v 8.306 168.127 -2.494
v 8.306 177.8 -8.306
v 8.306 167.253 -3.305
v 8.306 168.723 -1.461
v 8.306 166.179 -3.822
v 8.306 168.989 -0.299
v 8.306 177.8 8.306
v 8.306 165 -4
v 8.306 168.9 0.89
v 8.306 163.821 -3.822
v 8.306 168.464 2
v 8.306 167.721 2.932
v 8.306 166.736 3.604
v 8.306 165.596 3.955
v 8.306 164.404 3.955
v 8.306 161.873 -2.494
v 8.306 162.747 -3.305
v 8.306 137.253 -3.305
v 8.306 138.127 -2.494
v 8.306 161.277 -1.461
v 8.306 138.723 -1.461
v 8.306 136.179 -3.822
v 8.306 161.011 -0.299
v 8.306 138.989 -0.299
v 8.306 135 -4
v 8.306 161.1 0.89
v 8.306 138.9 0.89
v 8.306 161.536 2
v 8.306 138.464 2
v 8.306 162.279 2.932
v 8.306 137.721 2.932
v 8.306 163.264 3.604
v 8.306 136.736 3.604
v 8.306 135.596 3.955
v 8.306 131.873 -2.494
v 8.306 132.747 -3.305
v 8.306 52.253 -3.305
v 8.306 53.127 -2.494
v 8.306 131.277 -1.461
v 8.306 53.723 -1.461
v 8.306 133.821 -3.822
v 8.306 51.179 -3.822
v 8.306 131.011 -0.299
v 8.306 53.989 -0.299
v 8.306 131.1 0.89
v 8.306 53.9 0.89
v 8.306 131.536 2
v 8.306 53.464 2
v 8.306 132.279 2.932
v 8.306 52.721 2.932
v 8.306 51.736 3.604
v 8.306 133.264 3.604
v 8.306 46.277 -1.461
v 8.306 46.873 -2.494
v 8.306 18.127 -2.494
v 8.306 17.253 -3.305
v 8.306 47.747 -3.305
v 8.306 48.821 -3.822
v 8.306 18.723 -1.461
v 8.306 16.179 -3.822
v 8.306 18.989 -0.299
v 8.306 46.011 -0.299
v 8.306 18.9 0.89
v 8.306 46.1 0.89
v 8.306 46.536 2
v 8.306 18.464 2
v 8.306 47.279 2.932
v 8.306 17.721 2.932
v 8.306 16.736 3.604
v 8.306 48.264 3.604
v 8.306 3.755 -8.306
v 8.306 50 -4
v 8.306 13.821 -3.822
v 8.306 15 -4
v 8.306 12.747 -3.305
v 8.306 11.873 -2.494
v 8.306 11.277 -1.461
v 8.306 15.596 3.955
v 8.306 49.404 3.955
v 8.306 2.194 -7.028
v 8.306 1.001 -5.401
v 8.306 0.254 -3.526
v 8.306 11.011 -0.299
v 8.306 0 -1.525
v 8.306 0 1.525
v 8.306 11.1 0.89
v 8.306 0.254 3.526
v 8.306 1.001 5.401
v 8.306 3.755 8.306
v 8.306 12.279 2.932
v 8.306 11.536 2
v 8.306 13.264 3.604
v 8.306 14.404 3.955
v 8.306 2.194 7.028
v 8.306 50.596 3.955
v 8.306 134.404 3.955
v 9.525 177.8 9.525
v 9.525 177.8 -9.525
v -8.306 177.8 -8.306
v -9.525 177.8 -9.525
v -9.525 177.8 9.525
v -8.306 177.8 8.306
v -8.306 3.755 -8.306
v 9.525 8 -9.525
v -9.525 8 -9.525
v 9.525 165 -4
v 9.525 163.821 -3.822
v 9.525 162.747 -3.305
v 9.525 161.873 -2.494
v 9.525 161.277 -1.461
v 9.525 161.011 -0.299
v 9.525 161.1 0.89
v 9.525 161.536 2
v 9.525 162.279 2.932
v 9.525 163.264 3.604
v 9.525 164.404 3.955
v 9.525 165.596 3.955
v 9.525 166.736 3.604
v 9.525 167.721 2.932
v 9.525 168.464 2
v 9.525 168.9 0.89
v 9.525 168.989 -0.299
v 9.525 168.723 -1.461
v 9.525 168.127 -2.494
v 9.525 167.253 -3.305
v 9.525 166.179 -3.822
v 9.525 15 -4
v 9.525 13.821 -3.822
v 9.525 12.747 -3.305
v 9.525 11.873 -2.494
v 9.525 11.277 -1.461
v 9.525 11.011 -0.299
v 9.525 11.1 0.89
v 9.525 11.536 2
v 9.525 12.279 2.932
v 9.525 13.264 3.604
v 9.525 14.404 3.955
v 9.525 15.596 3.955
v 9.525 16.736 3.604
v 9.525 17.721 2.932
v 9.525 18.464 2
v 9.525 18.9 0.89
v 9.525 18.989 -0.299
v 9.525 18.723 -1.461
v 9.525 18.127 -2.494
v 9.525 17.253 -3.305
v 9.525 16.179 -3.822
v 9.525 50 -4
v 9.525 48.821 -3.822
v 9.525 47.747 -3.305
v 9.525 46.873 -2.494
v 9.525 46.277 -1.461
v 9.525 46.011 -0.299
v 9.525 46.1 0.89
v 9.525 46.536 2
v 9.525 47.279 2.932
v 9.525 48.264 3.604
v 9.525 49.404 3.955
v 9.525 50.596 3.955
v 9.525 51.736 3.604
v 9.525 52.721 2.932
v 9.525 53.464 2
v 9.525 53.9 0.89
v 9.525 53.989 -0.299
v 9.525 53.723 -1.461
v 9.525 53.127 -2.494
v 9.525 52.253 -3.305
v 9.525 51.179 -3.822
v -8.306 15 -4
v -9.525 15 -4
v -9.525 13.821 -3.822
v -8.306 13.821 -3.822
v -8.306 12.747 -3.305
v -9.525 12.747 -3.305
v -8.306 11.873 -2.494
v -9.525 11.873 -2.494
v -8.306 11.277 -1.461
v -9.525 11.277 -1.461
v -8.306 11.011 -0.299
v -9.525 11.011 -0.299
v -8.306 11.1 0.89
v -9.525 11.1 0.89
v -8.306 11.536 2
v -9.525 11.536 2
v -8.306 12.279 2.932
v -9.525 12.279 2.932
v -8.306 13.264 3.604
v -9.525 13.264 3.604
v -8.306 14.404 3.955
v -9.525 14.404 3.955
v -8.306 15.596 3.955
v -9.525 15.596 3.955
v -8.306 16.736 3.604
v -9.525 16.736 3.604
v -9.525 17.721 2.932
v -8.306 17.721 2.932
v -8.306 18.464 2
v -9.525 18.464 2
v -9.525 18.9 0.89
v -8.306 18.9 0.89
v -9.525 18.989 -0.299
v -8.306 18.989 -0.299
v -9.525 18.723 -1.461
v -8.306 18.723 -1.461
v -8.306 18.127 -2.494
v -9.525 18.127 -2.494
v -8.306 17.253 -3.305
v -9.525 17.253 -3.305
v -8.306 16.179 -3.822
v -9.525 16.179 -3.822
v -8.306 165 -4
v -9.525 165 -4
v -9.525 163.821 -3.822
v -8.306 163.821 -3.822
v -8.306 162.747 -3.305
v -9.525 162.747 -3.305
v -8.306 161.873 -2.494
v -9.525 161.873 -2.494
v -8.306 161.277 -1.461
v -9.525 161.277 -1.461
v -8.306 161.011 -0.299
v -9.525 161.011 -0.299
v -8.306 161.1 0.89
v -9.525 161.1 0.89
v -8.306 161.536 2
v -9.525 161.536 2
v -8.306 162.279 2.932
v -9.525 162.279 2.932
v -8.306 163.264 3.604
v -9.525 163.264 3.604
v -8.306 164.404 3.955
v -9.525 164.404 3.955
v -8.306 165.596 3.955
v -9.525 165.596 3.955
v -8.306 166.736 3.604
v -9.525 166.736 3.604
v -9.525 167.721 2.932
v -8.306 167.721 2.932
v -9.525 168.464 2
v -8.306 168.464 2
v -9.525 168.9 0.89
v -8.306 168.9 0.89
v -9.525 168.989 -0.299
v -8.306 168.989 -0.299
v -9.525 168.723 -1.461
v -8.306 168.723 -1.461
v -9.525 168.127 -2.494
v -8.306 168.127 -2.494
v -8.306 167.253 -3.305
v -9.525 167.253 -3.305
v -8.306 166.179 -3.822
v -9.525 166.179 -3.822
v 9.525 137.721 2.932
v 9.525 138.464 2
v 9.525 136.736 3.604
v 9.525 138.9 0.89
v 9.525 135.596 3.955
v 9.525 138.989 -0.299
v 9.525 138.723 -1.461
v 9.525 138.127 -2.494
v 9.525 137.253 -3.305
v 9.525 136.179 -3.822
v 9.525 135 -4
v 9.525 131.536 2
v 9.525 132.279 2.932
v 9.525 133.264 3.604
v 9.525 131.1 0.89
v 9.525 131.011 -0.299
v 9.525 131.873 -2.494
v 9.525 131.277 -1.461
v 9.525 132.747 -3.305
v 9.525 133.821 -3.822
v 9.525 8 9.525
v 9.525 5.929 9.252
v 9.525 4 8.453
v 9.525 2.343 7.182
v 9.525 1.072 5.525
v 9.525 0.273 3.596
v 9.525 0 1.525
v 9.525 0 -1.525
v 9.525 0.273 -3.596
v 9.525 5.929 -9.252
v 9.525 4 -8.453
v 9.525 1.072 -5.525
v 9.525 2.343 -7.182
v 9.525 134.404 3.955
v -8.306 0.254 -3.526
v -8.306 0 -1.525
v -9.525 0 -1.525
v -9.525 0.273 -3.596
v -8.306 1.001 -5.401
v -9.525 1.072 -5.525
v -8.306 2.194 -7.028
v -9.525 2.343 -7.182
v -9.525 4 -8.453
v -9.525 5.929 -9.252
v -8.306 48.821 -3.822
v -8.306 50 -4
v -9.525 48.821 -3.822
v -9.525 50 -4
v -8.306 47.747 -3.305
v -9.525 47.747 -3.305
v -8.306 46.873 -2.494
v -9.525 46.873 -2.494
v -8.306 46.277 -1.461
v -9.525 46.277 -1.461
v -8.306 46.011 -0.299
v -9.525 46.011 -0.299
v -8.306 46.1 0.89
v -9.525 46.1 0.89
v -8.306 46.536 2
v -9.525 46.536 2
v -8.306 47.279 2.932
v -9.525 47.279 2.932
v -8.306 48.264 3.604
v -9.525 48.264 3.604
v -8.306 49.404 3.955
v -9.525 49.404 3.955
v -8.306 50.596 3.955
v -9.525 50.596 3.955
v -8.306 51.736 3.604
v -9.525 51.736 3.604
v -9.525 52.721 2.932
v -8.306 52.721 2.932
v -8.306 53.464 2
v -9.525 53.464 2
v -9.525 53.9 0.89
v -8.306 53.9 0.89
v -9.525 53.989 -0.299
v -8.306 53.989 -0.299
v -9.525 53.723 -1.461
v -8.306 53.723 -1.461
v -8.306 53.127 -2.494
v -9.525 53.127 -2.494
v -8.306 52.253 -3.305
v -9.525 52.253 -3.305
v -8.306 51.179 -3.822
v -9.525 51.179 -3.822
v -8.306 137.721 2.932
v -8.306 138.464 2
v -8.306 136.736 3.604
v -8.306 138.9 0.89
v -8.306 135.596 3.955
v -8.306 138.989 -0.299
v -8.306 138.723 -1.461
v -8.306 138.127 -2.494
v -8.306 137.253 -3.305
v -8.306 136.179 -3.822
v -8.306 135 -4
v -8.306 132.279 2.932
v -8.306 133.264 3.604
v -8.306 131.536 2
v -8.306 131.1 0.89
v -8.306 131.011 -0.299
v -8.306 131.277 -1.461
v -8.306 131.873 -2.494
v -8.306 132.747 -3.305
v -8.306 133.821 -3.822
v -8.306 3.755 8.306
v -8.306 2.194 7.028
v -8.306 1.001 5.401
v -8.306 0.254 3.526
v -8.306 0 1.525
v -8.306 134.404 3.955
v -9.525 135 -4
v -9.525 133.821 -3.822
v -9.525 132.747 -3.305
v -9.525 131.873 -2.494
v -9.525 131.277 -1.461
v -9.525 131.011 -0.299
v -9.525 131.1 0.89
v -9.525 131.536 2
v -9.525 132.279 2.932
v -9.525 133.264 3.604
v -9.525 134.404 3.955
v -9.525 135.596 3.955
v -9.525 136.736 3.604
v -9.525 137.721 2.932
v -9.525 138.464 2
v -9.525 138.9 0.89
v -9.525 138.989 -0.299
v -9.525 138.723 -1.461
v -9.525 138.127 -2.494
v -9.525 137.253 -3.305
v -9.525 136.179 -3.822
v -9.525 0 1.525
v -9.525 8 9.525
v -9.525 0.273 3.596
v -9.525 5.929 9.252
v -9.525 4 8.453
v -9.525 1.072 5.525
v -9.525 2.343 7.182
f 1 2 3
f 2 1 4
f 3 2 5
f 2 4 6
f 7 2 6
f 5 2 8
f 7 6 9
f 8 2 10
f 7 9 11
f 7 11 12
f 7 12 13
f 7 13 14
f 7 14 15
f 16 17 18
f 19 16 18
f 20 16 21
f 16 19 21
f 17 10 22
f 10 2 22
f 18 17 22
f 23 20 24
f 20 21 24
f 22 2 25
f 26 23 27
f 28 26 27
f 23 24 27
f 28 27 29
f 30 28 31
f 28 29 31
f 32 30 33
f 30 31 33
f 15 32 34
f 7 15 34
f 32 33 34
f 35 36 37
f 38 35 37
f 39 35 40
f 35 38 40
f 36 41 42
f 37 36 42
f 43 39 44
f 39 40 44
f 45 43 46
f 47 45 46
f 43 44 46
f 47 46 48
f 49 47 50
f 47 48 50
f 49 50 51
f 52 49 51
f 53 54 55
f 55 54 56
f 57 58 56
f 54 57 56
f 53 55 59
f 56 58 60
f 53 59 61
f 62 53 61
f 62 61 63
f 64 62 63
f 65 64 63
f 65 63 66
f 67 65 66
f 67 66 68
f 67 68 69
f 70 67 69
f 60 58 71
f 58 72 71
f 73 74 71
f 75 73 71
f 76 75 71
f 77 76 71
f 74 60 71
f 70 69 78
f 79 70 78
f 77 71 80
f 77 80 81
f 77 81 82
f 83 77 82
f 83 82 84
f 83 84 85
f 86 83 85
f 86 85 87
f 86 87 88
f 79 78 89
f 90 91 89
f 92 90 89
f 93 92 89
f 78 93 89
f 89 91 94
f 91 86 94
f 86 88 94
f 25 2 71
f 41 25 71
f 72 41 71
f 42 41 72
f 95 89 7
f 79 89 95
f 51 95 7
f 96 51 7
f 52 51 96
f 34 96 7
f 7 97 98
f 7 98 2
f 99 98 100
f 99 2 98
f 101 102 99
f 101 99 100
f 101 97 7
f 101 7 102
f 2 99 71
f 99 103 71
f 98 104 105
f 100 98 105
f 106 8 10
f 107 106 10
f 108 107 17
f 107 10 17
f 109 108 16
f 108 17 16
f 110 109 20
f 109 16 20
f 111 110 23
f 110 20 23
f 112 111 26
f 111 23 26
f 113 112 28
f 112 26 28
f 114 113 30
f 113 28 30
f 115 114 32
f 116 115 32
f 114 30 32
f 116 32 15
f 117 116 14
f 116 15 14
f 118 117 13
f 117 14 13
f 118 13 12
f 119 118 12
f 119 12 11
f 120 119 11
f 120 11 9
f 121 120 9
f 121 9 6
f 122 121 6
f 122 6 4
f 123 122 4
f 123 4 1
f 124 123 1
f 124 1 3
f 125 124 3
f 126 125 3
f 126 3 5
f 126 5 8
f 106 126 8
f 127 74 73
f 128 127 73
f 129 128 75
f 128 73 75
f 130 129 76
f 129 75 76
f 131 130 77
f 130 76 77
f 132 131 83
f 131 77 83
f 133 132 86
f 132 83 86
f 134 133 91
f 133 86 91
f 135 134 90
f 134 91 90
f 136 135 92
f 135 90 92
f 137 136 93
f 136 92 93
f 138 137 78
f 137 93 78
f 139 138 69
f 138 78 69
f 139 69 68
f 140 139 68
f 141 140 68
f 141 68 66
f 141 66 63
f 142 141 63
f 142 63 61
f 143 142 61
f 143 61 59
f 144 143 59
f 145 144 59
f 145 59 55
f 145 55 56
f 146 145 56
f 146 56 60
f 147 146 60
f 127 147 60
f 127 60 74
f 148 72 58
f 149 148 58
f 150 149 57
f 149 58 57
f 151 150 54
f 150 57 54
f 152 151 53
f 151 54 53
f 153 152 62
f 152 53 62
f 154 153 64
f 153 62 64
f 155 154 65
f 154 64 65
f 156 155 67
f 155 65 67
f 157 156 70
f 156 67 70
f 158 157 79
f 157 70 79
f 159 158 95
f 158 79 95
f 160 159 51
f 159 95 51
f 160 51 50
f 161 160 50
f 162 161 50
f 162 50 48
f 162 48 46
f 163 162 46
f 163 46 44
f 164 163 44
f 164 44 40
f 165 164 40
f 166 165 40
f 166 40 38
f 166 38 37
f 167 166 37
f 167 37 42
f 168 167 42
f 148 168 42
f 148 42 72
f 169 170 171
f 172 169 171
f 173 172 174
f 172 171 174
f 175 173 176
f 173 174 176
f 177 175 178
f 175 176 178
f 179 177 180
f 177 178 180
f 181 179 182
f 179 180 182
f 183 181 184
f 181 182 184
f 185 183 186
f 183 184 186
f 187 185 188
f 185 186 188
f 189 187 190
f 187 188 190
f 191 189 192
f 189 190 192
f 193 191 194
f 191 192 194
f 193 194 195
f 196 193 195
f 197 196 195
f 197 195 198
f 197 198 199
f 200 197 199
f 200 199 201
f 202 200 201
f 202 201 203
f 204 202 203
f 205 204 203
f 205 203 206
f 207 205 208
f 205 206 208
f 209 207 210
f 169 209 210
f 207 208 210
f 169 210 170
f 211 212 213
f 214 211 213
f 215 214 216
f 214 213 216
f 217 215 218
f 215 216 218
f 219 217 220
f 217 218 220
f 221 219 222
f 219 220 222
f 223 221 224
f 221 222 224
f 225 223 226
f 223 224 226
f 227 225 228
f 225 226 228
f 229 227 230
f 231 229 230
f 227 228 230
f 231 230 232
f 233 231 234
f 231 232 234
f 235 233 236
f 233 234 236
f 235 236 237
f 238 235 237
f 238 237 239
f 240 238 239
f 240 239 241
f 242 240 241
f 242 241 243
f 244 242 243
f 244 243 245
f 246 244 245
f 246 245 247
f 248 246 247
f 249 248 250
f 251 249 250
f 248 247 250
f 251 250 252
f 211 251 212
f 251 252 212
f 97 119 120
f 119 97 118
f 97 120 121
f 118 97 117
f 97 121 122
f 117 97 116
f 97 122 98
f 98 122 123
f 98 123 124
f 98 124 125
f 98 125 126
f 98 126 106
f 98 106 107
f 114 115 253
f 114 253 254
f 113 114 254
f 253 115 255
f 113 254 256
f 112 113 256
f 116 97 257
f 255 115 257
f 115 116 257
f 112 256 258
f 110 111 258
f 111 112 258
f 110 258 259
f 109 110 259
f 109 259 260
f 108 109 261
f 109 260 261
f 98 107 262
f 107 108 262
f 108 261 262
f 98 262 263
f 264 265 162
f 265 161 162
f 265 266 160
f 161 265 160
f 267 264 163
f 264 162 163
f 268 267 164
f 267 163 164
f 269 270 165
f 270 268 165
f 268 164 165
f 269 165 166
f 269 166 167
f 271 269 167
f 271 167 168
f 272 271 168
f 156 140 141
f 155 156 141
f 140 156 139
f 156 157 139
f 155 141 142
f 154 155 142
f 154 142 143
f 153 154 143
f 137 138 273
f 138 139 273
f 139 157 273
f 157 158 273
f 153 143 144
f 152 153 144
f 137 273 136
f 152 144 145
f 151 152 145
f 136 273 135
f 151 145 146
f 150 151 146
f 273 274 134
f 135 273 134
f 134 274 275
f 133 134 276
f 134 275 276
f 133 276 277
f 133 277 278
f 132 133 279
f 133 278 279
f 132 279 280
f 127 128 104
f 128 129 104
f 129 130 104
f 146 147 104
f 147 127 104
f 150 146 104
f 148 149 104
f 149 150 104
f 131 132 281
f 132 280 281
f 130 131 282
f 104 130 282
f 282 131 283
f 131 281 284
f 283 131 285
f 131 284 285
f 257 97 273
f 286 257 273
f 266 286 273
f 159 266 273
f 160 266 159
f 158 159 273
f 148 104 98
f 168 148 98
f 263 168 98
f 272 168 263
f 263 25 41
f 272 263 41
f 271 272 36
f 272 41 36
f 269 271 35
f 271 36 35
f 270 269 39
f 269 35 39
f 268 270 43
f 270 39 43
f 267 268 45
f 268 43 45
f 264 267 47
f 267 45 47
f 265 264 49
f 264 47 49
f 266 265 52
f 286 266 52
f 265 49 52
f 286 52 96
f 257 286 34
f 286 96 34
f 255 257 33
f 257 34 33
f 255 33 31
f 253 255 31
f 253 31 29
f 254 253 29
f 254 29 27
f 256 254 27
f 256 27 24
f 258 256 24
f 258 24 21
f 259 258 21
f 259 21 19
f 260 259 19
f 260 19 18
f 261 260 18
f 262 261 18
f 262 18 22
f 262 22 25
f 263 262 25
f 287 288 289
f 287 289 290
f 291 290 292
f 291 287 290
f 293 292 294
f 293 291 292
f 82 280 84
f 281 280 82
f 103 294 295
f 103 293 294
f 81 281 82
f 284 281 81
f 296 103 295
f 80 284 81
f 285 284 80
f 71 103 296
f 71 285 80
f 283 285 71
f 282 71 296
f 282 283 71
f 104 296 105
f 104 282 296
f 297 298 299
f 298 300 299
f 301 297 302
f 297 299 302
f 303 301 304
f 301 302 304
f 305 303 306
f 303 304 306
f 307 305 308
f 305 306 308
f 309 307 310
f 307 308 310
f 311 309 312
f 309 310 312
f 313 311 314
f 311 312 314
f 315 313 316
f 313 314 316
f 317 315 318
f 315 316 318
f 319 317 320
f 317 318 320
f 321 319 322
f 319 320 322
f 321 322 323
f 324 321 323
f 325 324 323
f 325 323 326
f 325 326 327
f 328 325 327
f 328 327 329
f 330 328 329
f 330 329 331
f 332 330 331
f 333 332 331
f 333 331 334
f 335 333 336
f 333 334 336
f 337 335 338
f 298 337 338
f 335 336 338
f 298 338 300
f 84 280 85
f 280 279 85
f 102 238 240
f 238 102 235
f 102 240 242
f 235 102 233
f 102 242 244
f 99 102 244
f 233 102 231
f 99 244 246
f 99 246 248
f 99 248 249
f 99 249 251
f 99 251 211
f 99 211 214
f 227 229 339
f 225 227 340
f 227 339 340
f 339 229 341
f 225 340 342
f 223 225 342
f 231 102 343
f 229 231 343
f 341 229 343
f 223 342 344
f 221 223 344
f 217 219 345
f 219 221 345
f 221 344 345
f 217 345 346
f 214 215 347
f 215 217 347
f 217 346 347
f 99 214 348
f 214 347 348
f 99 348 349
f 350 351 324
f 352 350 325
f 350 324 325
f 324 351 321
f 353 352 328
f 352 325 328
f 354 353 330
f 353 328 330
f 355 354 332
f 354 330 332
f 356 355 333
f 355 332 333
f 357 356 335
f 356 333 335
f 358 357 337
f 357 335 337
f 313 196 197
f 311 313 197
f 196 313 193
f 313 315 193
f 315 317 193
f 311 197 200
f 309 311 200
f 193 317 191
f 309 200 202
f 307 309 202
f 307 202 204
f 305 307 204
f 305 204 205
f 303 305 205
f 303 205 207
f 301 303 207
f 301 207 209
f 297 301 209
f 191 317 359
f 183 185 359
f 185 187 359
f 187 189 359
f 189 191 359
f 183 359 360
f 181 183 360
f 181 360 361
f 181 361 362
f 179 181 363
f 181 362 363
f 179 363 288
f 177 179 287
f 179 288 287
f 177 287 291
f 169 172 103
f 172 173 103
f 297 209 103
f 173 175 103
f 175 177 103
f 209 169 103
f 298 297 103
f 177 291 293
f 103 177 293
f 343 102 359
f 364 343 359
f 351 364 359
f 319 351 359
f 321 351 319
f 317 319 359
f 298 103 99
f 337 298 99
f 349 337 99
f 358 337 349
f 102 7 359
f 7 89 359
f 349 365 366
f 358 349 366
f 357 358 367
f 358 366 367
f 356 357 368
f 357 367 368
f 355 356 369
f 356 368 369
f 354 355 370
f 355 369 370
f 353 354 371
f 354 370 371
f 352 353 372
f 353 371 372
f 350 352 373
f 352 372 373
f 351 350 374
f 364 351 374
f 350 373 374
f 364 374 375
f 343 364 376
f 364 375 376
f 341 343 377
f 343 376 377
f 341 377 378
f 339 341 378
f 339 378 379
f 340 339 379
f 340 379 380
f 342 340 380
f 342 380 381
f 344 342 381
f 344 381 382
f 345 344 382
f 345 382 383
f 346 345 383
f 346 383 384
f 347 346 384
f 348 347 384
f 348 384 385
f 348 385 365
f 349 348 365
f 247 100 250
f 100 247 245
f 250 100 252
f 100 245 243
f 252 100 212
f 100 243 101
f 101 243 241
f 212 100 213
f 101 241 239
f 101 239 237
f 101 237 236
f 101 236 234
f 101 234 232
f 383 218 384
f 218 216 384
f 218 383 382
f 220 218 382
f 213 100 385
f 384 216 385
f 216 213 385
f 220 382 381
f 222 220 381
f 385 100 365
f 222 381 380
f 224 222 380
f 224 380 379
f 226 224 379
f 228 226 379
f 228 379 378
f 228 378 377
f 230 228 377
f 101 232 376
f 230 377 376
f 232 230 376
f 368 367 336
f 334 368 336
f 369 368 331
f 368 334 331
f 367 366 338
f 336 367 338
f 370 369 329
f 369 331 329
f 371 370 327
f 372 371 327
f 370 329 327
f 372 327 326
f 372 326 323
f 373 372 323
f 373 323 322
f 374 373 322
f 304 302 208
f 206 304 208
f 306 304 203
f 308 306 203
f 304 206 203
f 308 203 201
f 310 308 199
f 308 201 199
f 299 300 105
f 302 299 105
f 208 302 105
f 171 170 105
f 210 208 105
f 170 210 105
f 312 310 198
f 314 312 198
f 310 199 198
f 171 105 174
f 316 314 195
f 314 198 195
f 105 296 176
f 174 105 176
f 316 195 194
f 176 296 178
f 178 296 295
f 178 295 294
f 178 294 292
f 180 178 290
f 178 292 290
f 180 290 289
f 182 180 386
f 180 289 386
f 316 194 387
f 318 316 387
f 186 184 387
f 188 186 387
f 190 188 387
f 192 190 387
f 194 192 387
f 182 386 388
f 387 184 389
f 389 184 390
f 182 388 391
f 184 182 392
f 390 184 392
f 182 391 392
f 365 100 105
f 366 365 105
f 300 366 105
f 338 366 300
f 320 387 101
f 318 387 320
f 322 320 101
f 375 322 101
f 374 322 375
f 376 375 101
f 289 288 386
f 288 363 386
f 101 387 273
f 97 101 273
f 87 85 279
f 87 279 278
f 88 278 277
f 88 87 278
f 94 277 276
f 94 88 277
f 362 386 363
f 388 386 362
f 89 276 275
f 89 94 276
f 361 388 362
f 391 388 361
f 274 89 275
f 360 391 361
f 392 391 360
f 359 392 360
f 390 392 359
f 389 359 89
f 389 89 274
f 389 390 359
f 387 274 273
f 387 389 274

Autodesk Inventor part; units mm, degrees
ref_plane "YZ Plane" through (0, 0, 0) normal (1, 0, 0) x (0, 1, 0)
ref_plane "XZ Plane" through (0, 0, 0) normal (0, 1, 0) x (-1, 0, 0)
ref_plane "XY Plane" through (0, 0, 0) normal (0, 0, 1) x (1, 0, 0)
sketch "Sketch4" plane through (0, 0, 0) normal (0, 1, 0) x (-1, 0, 0)
  line L0 (-9.525, -9.525) -> (9.525, -9.525)
  line L1 (9.525, -9.525) -> (9.525, 9.525)
  line L2 (9.525, 9.525) -> (-9.525, 9.525)
  line L3 (-9.525, 9.525) -> (-9.525, -9.525)
  line L4 (0, -13.335) -> (0, 13.335) construction
  line L5 (13.335, 0) -> (-13.335, 0) construction
  line L6 (-8.3058, 8.3058) -> (8.3058, 8.3058)
  line L7 (8.3058, 8.3058) -> (8.3058, -8.3058)
  line L8 (8.3058, -8.3058) -> (-8.3058, -8.3058)
  line L9 (-8.3058, -8.3058) -> (-8.3058, 8.3058)
  point P0 (0, 0)
  dimension "d44" = 19.05
  dimension "d45" = 1.2192
extrude "Extrusion2" add sketch "Sketch4" along normal blind 177.8
sketch "Sketch5" plane through (0, 0, 0) normal (1, 0, 0) x (0, 1, 0)
  line L0 (0, 115.5) -> (0, -115.5) construction
  line L1 (-33, 0) -> (198, 0) construction
  line L2 (165, 0) -> (135, 0)
  point P0 (0, 0)
  point P1 (50, 0)
  point P2 (15, 0)
  point P3 (150, 0)
  dimension "d48" = 15
  dimension "d49" = 50
  dimension "d50" = 30
  dimension "d51" = 135
  dimension "d59" = 150
hole "Hole2" at (0, 50, 0) at (0, 15, 0) at (0, 165, 0) at (0, 135, 0) direction (-1, 0, 0) diameter 8 end through all both
fillet "Fillet2" radius 8 2 edges at (0, 0, -9.525) (0, 0, 9.525)
properties part number "Pedalbox_V2_Brake_Extrusion"
